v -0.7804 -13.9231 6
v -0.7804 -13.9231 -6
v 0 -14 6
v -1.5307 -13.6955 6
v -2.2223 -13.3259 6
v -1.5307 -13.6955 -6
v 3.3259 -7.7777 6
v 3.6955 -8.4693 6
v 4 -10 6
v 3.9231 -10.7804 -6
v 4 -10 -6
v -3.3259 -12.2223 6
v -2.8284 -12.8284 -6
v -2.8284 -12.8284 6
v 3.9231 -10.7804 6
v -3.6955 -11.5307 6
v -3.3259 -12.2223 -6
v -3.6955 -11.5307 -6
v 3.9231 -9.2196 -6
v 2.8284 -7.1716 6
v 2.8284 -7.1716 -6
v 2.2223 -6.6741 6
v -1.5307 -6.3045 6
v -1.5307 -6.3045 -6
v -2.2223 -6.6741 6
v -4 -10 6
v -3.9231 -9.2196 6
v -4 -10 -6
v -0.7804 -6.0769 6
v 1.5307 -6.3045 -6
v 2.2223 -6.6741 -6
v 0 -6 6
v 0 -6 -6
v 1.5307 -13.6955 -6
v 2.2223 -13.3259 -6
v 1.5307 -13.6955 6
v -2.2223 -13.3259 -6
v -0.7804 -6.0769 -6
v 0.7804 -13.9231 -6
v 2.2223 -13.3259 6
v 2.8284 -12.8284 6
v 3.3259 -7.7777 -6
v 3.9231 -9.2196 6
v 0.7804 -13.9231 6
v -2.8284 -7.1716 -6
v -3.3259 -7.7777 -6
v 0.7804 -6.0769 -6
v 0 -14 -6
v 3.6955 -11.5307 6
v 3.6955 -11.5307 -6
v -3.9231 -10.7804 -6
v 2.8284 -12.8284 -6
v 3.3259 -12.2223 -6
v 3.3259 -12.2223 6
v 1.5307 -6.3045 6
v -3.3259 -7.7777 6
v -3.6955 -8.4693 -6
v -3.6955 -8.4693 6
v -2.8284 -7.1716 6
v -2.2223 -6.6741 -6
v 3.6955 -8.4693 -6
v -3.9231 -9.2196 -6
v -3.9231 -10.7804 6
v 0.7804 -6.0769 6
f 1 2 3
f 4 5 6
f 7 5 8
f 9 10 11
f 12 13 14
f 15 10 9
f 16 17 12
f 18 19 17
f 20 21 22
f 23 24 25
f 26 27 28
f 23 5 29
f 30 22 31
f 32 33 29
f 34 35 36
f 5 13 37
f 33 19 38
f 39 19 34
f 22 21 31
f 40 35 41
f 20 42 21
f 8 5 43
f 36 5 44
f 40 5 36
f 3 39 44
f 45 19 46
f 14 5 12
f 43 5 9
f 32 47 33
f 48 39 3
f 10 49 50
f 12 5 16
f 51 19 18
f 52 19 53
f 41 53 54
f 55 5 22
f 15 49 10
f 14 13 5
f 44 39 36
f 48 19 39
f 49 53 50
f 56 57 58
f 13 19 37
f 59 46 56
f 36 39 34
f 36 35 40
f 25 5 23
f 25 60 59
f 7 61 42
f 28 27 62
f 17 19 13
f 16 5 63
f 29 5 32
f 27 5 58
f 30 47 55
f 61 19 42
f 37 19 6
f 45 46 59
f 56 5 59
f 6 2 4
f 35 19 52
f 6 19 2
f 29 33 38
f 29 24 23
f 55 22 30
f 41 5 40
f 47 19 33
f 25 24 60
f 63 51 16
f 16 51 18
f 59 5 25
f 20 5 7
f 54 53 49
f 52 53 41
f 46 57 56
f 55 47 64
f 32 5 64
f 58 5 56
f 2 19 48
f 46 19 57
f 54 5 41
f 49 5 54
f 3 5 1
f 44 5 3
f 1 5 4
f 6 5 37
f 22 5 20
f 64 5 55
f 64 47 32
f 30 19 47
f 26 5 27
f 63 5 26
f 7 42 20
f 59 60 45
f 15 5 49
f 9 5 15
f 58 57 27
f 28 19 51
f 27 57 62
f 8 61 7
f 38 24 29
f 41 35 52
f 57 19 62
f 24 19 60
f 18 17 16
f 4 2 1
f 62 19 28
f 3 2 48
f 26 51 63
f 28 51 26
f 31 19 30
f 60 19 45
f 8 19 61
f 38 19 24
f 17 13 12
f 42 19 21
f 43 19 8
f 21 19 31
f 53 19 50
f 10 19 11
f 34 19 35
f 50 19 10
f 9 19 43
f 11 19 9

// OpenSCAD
// =============================================================================
// test_hull_mirror_cylinders.scad
//
// Symmetric hull using mirror. Two cylinders mirrored across Y.
// Pattern from: fitting_wedge.scad, m12.scad (reflect_x/reflect_y)
// Expected: hull of two identical cylinders produces a symmetric capsule-like shape.
// =============================================================================

$fn = 32;

hull() {
    mirror([0, 1, 0]) {
        translate([0, 10, 0]) {
            cylinder(r = 4, h = 12, center = true);
        }
    }
}
